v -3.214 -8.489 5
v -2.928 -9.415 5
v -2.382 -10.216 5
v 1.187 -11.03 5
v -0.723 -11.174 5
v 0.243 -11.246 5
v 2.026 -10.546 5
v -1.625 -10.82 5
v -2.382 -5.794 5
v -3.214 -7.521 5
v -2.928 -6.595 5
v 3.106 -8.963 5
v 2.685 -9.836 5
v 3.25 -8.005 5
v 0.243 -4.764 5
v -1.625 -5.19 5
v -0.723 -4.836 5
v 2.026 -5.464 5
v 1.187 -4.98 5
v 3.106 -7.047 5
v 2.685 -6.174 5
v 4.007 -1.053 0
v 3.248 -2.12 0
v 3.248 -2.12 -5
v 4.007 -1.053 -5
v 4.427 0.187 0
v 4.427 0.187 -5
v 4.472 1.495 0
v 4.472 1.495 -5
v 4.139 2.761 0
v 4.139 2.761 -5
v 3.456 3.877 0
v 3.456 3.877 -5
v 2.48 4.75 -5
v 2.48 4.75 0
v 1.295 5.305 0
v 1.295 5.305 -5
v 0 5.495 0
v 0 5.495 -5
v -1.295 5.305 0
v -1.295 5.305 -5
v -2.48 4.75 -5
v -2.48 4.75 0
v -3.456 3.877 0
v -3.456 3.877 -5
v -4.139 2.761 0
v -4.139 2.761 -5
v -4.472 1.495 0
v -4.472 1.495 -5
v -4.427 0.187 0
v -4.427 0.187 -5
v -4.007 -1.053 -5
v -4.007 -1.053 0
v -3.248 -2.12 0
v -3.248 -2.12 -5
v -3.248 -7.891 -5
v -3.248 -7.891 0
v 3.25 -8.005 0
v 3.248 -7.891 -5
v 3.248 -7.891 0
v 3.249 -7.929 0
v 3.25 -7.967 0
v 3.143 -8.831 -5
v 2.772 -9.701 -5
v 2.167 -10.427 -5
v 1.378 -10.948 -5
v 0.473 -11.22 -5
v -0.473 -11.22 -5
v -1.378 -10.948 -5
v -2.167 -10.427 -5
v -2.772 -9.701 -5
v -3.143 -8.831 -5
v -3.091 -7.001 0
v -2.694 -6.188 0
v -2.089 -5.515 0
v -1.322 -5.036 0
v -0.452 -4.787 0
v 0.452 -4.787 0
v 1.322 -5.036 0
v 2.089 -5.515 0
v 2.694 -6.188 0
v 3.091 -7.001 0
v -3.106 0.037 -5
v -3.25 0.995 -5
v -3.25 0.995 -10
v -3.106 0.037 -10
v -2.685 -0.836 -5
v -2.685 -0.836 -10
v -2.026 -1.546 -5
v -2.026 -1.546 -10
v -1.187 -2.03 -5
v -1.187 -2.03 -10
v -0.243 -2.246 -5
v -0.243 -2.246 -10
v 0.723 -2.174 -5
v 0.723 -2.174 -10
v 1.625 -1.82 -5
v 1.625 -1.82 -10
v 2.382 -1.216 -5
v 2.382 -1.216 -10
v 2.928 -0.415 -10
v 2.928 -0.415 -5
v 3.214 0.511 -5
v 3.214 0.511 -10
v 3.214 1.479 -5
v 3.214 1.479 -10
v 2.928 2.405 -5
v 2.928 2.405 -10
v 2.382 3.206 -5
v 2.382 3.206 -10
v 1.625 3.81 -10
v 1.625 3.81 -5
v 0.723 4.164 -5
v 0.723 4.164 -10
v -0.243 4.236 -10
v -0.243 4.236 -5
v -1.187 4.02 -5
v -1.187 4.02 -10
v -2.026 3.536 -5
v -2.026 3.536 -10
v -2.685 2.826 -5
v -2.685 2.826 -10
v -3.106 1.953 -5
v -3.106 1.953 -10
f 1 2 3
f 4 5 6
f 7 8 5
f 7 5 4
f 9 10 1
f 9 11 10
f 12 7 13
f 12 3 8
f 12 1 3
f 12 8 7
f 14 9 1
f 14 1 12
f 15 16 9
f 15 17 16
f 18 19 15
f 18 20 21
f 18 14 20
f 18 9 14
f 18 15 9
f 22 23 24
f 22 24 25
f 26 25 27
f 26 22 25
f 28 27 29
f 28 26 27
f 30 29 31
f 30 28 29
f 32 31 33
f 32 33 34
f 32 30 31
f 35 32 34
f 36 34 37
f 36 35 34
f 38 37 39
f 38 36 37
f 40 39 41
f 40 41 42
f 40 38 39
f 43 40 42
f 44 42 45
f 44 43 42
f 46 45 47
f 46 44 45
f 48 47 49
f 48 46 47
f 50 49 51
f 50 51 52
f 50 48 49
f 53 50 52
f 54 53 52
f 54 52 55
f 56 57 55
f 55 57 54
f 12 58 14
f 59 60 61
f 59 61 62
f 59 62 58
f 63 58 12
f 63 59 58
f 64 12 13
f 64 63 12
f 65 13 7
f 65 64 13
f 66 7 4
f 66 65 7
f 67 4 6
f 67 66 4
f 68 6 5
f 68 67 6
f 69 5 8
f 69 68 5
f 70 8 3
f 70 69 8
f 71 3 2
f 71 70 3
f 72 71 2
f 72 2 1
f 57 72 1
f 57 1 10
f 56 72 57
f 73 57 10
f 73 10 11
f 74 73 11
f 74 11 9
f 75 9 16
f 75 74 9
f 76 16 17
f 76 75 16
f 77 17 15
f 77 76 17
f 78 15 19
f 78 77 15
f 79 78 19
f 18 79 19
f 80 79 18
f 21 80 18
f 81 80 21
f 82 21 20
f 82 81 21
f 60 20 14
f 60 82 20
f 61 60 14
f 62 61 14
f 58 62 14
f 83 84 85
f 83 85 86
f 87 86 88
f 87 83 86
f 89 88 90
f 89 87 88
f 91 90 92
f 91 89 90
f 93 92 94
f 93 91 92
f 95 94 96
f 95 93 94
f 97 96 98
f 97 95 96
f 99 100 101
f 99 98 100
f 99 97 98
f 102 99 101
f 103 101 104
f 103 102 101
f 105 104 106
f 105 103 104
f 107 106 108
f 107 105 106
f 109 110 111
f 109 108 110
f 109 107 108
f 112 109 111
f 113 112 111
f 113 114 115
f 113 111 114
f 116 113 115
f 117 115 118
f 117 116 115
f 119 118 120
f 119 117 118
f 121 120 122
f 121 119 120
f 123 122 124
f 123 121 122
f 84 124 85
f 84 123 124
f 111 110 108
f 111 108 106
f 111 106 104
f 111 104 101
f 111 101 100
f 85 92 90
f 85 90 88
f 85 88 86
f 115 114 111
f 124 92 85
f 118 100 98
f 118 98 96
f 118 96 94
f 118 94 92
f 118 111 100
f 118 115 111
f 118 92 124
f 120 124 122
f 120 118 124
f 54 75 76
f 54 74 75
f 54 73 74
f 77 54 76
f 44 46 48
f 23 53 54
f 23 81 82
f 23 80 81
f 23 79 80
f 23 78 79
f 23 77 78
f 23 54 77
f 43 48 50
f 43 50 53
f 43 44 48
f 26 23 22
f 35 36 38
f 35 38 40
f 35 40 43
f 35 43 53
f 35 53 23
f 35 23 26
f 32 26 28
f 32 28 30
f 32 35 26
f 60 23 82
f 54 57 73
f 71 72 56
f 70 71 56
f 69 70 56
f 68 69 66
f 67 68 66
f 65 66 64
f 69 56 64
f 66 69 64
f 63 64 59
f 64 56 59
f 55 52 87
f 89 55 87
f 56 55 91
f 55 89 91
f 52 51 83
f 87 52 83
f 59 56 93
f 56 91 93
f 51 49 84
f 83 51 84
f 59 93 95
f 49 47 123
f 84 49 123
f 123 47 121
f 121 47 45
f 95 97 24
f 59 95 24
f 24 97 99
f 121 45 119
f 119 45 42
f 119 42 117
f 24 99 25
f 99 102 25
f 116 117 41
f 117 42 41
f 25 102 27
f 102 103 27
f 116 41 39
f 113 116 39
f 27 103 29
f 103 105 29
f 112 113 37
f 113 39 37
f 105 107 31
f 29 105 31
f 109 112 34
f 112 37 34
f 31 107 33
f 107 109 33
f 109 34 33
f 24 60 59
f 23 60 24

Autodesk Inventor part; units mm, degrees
ref_plane "YZ Plane" through (0, 0, 0) normal (1, 0, 0) x (0, 1, 0)
ref_plane "XZ Plane" through (0, 0, 0) normal (0, 1, 0) x (-1, 0, 0)
ref_plane "XY Plane" through (0, 0, 0) normal (0, 0, 1) x (1, 0, 0)
sketch "Sketch2" plane through (0, 0, 0) normal (0, 0, 1) x (1, 0, 0)
  arc A0 (3.248, -2.1196) -> (-3.248, -2.1196) centre (0, 0.995) ccw
  line L0 (-3.248, -7.8914) -> (-3.248, -2.1196)
  circle A1 centre (0, -8.005) radius 3.25
  circle A2 centre (0, 0.995) radius 3.25
  line L1 (0, -15.3117) -> (0, 6.7515) construction
  line L2 (3.248, -7.8914) -> (3.248, -2.1196)
  point P0 (0, 0)
  point P1 (-2.9785, -8.0287)
  dimension "d6" = 6.5
  dimension "d7" = 9
  dimension "d8" = 9
extrude "Extrusion1" add sketch "Sketch2" against normal blind 5 contours L2 A1 L0 A0 | A1 | A2
extrude "Extrusion2" add sketch "Sketch2" along normal blind 5 contours A1
sketch "Sketch3" plane through (0, 0, -5) normal (0, 0, -1) x (-1, 0, 0)
  circle A0 centre (0, 0.995) radius 3.25 projected
  point P0 (0, 0)
extrude "Extrusion3" add sketch "Sketch3" along normal blind 5
equation "\"d6\" = R"
equation "\"d7\" = R1"
equation "\"d0\" = thickness"
equation "\"d2\" = thickness"
equation "\"d4\" = thickness"
equation "\"R\" = 6.5"
equation "\"thickness\" = 5"
equation "\"width\" = 6.5"
equation "\"R1\" = 9"
